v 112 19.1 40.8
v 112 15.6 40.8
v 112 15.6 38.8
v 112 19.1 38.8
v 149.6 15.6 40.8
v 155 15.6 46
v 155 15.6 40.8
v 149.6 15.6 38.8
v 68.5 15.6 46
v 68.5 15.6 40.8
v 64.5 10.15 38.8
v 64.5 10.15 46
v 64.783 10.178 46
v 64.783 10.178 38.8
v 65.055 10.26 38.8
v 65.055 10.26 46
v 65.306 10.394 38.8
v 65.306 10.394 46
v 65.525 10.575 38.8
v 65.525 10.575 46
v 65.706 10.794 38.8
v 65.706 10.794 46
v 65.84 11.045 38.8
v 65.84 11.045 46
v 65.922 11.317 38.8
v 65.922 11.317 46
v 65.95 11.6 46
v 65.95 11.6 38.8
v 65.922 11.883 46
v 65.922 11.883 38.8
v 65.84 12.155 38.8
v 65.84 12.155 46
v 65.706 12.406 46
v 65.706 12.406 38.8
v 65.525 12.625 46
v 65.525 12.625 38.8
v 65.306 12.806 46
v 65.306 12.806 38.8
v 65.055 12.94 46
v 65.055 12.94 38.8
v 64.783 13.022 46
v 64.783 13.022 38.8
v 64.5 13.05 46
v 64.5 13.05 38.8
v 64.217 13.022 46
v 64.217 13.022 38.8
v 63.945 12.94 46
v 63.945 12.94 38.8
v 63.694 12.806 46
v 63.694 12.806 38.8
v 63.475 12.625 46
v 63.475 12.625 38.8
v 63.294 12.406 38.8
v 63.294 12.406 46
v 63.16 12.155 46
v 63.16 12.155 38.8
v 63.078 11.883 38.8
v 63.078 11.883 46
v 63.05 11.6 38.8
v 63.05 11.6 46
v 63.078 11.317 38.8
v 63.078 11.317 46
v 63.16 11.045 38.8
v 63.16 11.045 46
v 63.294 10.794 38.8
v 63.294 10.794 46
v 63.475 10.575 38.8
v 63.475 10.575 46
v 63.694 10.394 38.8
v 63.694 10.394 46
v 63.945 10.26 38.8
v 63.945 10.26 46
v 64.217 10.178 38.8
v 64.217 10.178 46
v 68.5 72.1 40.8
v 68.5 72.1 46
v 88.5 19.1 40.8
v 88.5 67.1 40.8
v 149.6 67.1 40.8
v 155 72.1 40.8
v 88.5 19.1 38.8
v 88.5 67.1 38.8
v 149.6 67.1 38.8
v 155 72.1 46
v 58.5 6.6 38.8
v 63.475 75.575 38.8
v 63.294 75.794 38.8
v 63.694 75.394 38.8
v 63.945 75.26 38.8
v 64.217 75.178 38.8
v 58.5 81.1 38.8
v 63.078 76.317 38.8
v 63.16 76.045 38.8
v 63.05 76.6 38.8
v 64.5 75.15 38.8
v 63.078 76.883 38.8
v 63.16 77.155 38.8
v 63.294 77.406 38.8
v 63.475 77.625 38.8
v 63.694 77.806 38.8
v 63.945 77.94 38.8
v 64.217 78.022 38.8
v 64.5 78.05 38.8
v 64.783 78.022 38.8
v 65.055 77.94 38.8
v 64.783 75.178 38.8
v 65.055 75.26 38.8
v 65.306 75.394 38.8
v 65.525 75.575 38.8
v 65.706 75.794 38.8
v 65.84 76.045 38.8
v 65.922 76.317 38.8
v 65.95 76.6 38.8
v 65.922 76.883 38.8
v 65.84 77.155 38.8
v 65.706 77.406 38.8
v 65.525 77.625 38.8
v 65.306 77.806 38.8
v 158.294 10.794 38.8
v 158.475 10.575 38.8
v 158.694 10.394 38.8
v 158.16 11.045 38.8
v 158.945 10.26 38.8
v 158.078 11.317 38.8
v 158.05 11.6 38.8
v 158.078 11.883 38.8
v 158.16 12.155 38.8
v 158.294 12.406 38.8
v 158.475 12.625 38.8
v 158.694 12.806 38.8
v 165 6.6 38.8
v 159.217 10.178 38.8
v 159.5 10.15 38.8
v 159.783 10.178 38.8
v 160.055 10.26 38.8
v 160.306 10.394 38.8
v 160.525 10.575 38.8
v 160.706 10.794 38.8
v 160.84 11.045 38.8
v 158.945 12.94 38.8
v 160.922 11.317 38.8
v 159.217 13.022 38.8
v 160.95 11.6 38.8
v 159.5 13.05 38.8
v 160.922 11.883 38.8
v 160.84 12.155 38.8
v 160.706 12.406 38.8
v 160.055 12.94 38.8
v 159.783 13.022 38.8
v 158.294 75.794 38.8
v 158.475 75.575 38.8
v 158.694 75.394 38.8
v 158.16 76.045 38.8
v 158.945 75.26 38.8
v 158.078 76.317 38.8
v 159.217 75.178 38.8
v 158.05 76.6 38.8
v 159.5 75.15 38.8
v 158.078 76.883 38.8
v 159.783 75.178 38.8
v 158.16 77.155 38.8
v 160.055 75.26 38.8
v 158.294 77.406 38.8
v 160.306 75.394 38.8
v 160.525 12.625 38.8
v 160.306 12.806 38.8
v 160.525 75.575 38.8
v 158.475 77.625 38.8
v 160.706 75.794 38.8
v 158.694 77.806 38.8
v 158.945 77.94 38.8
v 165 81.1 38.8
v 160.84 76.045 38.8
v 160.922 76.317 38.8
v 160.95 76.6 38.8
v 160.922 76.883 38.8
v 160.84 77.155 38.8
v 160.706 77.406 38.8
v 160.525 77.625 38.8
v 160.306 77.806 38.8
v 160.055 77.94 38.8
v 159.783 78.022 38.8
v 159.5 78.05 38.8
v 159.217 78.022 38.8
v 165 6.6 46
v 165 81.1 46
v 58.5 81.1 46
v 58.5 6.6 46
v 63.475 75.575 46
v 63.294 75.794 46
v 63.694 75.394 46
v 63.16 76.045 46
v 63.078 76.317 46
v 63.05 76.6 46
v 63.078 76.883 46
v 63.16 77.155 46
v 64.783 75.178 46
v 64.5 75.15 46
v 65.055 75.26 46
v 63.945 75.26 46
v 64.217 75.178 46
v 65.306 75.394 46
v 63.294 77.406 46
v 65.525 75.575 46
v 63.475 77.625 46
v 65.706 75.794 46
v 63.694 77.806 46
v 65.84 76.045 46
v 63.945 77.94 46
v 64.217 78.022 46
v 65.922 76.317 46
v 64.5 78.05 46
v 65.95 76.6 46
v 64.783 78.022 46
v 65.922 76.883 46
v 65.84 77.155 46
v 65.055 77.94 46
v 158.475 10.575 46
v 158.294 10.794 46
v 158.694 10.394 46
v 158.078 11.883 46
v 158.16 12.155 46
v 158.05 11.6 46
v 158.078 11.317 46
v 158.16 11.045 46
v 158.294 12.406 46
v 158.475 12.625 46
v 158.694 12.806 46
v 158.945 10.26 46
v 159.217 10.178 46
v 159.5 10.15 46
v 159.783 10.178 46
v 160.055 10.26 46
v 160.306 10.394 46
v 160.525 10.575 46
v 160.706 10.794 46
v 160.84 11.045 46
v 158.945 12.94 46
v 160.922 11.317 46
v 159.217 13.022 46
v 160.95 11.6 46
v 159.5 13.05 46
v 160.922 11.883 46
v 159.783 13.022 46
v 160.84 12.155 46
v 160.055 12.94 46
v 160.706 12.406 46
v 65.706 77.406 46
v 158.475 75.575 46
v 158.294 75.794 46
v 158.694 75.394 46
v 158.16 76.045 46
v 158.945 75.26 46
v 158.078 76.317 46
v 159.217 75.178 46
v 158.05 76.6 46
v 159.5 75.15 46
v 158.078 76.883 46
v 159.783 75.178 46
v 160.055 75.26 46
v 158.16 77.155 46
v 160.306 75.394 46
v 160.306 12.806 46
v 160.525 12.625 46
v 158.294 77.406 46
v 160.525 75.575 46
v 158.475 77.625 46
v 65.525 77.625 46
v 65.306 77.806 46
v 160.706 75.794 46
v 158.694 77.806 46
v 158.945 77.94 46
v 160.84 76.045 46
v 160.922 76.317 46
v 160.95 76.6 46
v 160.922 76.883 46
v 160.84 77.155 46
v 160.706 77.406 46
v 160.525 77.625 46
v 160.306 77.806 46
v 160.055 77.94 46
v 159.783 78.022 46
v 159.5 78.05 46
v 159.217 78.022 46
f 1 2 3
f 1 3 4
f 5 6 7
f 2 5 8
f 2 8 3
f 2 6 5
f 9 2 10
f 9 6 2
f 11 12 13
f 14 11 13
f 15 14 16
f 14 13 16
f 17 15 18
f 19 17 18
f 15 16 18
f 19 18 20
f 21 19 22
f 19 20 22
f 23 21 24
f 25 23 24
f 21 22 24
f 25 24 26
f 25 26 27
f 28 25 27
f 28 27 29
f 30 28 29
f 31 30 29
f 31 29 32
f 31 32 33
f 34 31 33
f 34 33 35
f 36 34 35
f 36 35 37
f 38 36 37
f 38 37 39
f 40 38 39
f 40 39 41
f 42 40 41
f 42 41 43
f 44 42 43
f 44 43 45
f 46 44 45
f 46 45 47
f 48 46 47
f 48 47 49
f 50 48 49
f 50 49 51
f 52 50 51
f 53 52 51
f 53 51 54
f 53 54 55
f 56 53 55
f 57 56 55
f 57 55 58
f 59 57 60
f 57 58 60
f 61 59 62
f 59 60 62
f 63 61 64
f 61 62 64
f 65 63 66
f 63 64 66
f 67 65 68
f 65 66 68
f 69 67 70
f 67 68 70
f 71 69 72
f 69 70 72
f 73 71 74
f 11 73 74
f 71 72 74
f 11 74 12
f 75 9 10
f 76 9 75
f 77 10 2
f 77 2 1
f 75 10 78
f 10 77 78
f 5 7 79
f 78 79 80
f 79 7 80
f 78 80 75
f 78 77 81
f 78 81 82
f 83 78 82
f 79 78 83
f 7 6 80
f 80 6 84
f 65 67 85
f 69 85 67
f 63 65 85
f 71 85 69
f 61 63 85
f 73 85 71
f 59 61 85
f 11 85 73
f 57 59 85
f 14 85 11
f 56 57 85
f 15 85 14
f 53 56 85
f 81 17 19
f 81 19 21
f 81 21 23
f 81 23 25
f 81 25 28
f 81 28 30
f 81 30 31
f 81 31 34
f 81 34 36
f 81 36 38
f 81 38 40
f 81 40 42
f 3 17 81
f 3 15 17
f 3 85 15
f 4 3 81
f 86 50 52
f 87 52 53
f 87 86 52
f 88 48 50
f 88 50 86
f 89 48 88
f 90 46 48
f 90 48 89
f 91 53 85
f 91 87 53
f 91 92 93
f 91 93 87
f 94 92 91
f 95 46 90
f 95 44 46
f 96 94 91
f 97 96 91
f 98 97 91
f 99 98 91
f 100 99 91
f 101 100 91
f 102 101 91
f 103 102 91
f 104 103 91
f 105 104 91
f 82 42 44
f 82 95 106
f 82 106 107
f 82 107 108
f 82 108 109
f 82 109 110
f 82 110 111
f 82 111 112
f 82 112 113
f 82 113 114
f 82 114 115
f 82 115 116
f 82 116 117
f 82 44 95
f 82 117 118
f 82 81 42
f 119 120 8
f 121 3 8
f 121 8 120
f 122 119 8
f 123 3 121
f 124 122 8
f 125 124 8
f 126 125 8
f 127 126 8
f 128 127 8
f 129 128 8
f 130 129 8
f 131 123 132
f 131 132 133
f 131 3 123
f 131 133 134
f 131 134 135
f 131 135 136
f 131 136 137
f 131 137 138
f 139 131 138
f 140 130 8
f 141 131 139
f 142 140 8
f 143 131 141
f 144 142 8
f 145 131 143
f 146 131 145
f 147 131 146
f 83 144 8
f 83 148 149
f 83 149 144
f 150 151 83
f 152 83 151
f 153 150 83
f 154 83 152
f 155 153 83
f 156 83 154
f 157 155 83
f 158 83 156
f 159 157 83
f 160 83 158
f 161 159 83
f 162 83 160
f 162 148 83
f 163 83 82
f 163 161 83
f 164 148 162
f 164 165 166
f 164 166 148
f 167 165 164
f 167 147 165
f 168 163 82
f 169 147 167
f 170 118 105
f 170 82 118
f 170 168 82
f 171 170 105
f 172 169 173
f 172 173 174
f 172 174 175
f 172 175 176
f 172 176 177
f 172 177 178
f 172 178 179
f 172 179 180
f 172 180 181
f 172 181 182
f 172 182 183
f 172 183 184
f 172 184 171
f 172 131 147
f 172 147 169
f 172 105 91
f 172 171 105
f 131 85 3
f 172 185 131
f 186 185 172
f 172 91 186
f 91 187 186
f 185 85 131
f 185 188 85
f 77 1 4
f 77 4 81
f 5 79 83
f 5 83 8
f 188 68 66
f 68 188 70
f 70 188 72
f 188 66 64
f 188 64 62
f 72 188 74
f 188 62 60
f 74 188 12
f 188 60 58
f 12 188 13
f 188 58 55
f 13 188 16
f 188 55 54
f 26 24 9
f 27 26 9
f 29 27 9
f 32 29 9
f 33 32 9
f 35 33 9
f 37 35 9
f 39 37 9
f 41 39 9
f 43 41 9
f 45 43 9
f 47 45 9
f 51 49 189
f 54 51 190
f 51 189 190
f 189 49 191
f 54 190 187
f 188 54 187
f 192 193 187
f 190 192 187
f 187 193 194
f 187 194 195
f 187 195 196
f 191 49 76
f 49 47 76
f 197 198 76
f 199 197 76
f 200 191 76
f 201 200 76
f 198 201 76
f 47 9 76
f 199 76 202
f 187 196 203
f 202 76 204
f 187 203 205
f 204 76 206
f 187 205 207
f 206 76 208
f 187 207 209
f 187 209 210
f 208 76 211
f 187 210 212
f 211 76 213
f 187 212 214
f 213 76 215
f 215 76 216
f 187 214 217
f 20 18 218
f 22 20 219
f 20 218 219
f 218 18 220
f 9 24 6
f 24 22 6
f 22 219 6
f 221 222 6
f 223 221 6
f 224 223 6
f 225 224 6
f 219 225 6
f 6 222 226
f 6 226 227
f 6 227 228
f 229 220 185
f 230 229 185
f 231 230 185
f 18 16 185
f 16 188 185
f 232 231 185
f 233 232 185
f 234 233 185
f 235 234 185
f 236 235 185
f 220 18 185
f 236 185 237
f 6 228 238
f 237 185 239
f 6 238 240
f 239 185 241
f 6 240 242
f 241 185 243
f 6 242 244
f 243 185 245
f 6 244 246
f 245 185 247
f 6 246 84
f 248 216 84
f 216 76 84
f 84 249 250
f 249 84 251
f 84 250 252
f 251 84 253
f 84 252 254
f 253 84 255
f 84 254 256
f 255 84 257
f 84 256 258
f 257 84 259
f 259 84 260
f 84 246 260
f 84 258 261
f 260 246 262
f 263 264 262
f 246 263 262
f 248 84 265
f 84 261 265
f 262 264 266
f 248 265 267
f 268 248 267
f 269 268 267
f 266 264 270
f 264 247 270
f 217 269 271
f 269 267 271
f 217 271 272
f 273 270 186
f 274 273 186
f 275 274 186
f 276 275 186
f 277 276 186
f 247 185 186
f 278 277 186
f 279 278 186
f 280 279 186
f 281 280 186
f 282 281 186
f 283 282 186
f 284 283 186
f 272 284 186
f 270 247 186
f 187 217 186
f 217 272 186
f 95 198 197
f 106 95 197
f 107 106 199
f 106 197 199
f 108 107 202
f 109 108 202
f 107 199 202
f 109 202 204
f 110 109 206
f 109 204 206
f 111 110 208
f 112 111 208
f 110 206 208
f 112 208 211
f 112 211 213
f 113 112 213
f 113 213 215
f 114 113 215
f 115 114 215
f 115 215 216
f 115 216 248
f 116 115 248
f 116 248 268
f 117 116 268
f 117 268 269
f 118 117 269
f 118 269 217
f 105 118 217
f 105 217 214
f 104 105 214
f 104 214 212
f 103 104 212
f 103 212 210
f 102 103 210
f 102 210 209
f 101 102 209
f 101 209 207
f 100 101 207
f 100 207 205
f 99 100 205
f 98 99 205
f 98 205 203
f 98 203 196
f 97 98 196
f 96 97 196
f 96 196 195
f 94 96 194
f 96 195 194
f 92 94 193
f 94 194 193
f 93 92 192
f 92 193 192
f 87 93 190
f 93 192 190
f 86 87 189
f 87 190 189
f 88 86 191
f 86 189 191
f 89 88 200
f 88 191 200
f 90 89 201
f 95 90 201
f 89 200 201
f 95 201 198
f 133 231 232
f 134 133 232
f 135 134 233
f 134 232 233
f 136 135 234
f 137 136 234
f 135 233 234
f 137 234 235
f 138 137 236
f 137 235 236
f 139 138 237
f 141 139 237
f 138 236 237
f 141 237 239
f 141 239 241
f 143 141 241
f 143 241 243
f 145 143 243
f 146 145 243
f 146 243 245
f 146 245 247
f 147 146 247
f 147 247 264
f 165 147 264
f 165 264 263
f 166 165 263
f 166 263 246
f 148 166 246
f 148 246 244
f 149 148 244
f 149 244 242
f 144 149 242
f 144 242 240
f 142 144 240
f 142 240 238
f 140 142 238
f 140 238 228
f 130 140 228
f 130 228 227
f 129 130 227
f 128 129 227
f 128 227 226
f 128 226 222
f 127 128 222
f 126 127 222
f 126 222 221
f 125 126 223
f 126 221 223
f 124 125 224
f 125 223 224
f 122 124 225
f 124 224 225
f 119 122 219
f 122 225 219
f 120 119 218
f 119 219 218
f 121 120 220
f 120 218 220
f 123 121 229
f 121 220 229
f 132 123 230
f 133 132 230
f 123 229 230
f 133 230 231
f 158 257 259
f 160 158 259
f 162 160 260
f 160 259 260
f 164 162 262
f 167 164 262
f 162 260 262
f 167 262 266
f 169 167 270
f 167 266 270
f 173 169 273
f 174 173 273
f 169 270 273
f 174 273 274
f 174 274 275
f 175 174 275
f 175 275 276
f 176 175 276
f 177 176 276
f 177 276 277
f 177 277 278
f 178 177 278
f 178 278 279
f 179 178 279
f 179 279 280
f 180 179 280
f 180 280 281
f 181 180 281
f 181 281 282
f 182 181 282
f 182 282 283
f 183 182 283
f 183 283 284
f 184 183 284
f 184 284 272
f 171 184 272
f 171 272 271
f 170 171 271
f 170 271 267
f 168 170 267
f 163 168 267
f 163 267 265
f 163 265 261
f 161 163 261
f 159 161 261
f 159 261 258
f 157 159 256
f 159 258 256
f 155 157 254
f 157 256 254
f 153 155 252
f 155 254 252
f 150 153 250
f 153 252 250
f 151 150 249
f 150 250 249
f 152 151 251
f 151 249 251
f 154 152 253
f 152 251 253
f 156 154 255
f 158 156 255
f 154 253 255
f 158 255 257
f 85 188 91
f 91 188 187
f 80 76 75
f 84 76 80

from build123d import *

# Parameters (mm, degrees)
SKETCH020_W     = 74.5
SKETCH020_H     = 106.5
SKETCH020_W_2   = 56.5
SKETCH020_H_2   = 86.5
PAD009_DEPTH    = 5.2
SKETCH021_W     = 74.5
SKETCH021_H     = 106.5
PAD010_DEPTH    = 2
SKETCH022_R     = 1.45
POCKET011_DEPTH = 9


with BuildPart() as part:
    # Sketch020 (on ShapeBinder) → Pad009 (new body)
    with BuildSketch(Plane.YX.offset(-46)):
        with Locations((43.85, 111.75)):
            Rectangle(SKETCH020_W, SKETCH020_H)
        with Locations((43.85, 111.75)):
            Rectangle(SKETCH020_W_2, SKETCH020_H_2, mode=Mode.SUBTRACT)
    extrude(amount=PAD009_DEPTH)

    # Sketch021 (on Face10 of Pad009) → Pad010 (join)
    with BuildSketch(Plane.YX.offset(-40.8)):
        with Locations((43.85, 111.75)):
            Rectangle(SKETCH021_W, SKETCH021_H)
        Polygon((67.1, 149.6), (15.6, 149.6), (15.6, 112), (19.1, 112), (19.1, 88.5), (67.1, 88.5), align=None, mode=Mode.SUBTRACT)
    extrude(amount=PAD010_DEPTH)

    # Sketch022 (on Face4 of Pad010) → Pocket011 (cut)
    with BuildSketch(Plane(origin=(0, 0, 46), x_dir=(0, -1, 0), z_dir=(0, 0, 1))):
        with Locations((-76.6, 159.5)):
            Circle(SKETCH022_R)
        with Locations((-11.6, 159.5)):
            Circle(SKETCH022_R)
        with Locations((-11.6, 64.5)):
            Circle(SKETCH022_R)
        with Locations((-76.6, 64.5)):
            Circle(SKETCH022_R)
    extrude(amount=-POCKET011_DEPTH, mode=Mode.SUBTRACT)


solid = part.part
